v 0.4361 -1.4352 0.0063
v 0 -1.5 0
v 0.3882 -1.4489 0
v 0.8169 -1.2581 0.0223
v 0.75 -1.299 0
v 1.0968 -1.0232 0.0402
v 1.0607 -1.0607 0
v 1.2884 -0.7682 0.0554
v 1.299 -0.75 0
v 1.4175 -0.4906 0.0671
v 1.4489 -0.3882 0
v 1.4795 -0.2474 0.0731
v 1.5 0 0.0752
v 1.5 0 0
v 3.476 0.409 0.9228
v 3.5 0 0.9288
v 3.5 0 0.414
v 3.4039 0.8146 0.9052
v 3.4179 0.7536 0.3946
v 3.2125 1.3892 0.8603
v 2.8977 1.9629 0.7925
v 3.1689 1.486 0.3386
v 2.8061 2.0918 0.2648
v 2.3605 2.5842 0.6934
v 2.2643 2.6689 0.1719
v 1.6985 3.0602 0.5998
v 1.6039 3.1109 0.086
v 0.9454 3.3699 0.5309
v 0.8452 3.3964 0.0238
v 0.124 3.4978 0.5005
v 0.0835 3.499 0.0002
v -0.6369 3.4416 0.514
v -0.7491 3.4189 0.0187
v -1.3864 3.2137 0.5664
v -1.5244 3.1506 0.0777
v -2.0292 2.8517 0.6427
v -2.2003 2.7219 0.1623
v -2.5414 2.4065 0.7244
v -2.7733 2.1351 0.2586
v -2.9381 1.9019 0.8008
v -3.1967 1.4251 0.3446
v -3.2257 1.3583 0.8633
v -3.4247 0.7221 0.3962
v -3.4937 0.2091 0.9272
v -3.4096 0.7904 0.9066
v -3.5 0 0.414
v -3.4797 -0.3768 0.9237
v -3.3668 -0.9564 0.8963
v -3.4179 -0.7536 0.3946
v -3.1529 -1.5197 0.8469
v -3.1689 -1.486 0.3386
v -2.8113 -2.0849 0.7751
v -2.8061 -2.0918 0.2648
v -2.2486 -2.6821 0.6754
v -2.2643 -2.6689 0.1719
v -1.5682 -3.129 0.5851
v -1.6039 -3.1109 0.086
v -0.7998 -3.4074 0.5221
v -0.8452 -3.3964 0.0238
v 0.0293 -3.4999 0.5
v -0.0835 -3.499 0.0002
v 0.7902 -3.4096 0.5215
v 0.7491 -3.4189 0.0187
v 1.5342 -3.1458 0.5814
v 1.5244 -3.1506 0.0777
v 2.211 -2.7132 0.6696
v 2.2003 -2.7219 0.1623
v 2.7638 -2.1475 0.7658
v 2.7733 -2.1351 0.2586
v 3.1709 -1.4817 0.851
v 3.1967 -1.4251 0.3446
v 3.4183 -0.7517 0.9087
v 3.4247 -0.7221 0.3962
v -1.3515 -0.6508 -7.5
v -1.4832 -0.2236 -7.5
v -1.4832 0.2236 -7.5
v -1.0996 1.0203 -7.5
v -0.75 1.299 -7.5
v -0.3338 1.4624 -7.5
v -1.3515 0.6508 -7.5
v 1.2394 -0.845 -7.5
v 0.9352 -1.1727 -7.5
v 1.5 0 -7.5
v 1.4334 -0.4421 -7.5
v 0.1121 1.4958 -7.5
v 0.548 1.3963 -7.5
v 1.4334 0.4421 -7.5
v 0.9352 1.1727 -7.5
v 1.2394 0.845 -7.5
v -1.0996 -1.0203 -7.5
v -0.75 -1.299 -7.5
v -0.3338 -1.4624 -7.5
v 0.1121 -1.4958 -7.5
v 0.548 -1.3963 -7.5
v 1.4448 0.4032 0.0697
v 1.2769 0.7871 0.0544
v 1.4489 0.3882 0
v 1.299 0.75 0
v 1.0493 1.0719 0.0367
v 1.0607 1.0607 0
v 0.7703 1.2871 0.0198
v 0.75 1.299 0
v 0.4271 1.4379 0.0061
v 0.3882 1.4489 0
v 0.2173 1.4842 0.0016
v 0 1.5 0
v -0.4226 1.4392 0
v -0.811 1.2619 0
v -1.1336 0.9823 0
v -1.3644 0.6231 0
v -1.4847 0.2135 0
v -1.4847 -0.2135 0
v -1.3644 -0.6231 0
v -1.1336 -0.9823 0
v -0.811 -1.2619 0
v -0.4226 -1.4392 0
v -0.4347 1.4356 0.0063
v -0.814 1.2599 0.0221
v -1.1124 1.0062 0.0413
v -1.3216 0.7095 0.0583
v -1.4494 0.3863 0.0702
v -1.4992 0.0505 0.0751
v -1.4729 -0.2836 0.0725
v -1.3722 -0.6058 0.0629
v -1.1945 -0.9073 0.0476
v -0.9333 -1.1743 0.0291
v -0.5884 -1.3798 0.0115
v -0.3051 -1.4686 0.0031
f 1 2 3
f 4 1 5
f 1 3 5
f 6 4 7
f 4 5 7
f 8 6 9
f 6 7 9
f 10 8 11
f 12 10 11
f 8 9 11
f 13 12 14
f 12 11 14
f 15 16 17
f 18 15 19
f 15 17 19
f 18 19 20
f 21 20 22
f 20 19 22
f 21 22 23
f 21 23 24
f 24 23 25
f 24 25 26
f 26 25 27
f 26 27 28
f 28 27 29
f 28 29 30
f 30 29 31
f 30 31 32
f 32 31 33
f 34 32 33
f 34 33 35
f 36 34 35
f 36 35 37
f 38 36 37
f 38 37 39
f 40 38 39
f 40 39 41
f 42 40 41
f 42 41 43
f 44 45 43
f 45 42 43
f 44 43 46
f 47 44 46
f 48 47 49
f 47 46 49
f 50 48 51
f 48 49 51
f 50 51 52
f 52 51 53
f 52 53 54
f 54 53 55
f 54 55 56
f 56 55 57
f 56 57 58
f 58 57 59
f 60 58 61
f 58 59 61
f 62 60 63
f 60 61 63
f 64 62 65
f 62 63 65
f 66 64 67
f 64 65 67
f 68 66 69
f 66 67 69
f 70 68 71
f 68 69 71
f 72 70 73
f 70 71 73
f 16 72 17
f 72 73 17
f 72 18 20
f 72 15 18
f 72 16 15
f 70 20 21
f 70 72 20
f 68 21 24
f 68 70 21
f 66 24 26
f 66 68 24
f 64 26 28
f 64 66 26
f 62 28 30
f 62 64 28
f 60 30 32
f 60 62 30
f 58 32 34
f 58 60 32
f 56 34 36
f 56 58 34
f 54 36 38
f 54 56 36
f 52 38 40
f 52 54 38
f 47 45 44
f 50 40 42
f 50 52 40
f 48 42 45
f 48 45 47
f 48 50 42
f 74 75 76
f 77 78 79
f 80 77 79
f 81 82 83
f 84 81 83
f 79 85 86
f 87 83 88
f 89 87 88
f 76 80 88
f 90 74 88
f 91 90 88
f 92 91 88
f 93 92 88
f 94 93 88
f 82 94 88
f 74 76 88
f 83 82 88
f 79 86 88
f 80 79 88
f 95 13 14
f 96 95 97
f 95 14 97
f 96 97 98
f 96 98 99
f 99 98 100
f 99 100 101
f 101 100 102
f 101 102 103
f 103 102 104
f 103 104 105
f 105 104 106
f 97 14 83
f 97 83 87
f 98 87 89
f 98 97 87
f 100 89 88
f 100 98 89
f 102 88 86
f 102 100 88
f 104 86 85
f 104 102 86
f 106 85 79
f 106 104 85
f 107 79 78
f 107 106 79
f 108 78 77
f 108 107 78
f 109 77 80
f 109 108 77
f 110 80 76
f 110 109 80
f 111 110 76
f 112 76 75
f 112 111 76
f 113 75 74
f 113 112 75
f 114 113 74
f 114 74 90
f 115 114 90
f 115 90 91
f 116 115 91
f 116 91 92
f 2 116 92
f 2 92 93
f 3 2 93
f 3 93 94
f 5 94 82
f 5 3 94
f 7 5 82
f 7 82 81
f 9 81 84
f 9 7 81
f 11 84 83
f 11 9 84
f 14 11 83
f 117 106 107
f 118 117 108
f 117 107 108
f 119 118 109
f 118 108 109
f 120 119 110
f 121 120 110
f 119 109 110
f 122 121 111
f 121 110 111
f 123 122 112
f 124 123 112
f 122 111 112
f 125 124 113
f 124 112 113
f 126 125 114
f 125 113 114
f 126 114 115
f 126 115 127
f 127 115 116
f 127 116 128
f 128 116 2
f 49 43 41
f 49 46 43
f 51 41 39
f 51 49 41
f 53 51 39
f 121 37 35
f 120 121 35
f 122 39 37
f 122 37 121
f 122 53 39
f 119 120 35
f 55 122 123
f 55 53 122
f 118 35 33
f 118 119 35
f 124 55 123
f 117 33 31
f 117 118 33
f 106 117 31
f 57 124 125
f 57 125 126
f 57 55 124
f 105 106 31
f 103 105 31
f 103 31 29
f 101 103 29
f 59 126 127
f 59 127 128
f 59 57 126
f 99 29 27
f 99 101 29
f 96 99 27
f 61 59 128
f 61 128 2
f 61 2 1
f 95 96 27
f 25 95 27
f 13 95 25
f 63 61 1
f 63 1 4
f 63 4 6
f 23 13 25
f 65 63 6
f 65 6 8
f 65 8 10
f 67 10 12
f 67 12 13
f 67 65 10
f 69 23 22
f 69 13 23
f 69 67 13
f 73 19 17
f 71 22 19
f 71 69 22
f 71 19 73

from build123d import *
from build123d.topology import SkipClean

# Parameters (mm, degrees)
CURVED_HOLDER_MAIN_BODY_SKETCH_R = 3.5
CURVED_HOLDER_MAIN_BODY_DEPTH    = 5
FILL_REMOVE_DEPTH                = 8.03562364
FILL_REMOVE_DEPTH_BACK           = 8.03562364
PIN_BODY_REACH                   = 7.036
PIN_BODY_END_RADIUS              = 15
PIN_BODY_SKETCH_R                = 1.5
PIN_BODY_DIRECTION_2_DEPTH       = 7.5


with BuildPart() as part:
    # Curved Holder Main Body Sketch → Curved Holder Main Body (new body)
    with BuildSketch(Plane.XY):
        Circle(CURVED_HOLDER_MAIN_BODY_SKETCH_R)
    extrude(amount=CURVED_HOLDER_MAIN_BODY_DEPTH)

    # Fill Remove Sketch → Fill Remove (cut, two sides: drawn at the far end of the back side and taken through both)
    with BuildSketch(Plane(origin=(0, 0, 0), x_dir=(1, 0, 0), z_dir=(0, 1, 0)).offset(-FILL_REMOVE_DEPTH_BACK)):
        with BuildLine():
            Line((3.5, -5), (3.5, -0.928752721))
            ThreePointArc((3.5, -0.928752721), (0, -0.5), (-3.5, -0.928752721))
            Line((-3.5, -0.928752721), (-3.5, -5))
            Line((-3.5, -5), (3.5, -5))
        make_face()
        with BuildLine():
            Line((-3.5, 0), (-3.5, -0.414047854))
            ThreePointArc((-3.5, -0.414047854), (0, 0), (3.5, -0.414047854))
            Line((3.5, -0.414047854), (3.5, 0))
            Line((3.5, 0), (3.5, 0.978197193))
            Line((3.5, 0.978197193), (-3.5, 0.978197193))
            Line((-3.5, 0.978197193), (-3.5, 0))
        make_face()
    extrude(amount=FILL_REMOVE_DEPTH + FILL_REMOVE_DEPTH_BACK, mode=Mode.SUBTRACT)

    # Pin Body: up to this cylinder (the profile starts outside it)
    with SkipClean():  # the faces are left unmerged after this step: merging them gives an invalid solid
        pin_body_end = Plane(origin=(0, 0, 15), z_dir=(0, 1, 0)) * Cylinder(PIN_BODY_END_RADIUS, 45.072, mode=Mode.PRIVATE)
        # Pin Body Sketch → Pin Body (add, up to the surface)
        with BuildSketch(Plane.XY, mode=Mode.PRIVATE) as pin_body_sk1:
            Circle(PIN_BODY_SKETCH_R)
        pin_body_tool1 = extrude(pin_body_sk1.sketch, amount=PIN_BODY_REACH, mode=Mode.PRIVATE) - pin_body_end
        add(pin_body_tool1.solids().sort_by_distance((0, 0, 0))[0])
        add(pin_body_tool1.solids().sort_by_distance((0, 0, 0))[1])

    # Pin Body Sketch → Pin Body direction 2 (add)
    with BuildSketch(Plane.XY):
        Circle(PIN_BODY_SKETCH_R)
    extrude(amount=-PIN_BODY_DIRECTION_2_DEPTH)


solid = part.part
